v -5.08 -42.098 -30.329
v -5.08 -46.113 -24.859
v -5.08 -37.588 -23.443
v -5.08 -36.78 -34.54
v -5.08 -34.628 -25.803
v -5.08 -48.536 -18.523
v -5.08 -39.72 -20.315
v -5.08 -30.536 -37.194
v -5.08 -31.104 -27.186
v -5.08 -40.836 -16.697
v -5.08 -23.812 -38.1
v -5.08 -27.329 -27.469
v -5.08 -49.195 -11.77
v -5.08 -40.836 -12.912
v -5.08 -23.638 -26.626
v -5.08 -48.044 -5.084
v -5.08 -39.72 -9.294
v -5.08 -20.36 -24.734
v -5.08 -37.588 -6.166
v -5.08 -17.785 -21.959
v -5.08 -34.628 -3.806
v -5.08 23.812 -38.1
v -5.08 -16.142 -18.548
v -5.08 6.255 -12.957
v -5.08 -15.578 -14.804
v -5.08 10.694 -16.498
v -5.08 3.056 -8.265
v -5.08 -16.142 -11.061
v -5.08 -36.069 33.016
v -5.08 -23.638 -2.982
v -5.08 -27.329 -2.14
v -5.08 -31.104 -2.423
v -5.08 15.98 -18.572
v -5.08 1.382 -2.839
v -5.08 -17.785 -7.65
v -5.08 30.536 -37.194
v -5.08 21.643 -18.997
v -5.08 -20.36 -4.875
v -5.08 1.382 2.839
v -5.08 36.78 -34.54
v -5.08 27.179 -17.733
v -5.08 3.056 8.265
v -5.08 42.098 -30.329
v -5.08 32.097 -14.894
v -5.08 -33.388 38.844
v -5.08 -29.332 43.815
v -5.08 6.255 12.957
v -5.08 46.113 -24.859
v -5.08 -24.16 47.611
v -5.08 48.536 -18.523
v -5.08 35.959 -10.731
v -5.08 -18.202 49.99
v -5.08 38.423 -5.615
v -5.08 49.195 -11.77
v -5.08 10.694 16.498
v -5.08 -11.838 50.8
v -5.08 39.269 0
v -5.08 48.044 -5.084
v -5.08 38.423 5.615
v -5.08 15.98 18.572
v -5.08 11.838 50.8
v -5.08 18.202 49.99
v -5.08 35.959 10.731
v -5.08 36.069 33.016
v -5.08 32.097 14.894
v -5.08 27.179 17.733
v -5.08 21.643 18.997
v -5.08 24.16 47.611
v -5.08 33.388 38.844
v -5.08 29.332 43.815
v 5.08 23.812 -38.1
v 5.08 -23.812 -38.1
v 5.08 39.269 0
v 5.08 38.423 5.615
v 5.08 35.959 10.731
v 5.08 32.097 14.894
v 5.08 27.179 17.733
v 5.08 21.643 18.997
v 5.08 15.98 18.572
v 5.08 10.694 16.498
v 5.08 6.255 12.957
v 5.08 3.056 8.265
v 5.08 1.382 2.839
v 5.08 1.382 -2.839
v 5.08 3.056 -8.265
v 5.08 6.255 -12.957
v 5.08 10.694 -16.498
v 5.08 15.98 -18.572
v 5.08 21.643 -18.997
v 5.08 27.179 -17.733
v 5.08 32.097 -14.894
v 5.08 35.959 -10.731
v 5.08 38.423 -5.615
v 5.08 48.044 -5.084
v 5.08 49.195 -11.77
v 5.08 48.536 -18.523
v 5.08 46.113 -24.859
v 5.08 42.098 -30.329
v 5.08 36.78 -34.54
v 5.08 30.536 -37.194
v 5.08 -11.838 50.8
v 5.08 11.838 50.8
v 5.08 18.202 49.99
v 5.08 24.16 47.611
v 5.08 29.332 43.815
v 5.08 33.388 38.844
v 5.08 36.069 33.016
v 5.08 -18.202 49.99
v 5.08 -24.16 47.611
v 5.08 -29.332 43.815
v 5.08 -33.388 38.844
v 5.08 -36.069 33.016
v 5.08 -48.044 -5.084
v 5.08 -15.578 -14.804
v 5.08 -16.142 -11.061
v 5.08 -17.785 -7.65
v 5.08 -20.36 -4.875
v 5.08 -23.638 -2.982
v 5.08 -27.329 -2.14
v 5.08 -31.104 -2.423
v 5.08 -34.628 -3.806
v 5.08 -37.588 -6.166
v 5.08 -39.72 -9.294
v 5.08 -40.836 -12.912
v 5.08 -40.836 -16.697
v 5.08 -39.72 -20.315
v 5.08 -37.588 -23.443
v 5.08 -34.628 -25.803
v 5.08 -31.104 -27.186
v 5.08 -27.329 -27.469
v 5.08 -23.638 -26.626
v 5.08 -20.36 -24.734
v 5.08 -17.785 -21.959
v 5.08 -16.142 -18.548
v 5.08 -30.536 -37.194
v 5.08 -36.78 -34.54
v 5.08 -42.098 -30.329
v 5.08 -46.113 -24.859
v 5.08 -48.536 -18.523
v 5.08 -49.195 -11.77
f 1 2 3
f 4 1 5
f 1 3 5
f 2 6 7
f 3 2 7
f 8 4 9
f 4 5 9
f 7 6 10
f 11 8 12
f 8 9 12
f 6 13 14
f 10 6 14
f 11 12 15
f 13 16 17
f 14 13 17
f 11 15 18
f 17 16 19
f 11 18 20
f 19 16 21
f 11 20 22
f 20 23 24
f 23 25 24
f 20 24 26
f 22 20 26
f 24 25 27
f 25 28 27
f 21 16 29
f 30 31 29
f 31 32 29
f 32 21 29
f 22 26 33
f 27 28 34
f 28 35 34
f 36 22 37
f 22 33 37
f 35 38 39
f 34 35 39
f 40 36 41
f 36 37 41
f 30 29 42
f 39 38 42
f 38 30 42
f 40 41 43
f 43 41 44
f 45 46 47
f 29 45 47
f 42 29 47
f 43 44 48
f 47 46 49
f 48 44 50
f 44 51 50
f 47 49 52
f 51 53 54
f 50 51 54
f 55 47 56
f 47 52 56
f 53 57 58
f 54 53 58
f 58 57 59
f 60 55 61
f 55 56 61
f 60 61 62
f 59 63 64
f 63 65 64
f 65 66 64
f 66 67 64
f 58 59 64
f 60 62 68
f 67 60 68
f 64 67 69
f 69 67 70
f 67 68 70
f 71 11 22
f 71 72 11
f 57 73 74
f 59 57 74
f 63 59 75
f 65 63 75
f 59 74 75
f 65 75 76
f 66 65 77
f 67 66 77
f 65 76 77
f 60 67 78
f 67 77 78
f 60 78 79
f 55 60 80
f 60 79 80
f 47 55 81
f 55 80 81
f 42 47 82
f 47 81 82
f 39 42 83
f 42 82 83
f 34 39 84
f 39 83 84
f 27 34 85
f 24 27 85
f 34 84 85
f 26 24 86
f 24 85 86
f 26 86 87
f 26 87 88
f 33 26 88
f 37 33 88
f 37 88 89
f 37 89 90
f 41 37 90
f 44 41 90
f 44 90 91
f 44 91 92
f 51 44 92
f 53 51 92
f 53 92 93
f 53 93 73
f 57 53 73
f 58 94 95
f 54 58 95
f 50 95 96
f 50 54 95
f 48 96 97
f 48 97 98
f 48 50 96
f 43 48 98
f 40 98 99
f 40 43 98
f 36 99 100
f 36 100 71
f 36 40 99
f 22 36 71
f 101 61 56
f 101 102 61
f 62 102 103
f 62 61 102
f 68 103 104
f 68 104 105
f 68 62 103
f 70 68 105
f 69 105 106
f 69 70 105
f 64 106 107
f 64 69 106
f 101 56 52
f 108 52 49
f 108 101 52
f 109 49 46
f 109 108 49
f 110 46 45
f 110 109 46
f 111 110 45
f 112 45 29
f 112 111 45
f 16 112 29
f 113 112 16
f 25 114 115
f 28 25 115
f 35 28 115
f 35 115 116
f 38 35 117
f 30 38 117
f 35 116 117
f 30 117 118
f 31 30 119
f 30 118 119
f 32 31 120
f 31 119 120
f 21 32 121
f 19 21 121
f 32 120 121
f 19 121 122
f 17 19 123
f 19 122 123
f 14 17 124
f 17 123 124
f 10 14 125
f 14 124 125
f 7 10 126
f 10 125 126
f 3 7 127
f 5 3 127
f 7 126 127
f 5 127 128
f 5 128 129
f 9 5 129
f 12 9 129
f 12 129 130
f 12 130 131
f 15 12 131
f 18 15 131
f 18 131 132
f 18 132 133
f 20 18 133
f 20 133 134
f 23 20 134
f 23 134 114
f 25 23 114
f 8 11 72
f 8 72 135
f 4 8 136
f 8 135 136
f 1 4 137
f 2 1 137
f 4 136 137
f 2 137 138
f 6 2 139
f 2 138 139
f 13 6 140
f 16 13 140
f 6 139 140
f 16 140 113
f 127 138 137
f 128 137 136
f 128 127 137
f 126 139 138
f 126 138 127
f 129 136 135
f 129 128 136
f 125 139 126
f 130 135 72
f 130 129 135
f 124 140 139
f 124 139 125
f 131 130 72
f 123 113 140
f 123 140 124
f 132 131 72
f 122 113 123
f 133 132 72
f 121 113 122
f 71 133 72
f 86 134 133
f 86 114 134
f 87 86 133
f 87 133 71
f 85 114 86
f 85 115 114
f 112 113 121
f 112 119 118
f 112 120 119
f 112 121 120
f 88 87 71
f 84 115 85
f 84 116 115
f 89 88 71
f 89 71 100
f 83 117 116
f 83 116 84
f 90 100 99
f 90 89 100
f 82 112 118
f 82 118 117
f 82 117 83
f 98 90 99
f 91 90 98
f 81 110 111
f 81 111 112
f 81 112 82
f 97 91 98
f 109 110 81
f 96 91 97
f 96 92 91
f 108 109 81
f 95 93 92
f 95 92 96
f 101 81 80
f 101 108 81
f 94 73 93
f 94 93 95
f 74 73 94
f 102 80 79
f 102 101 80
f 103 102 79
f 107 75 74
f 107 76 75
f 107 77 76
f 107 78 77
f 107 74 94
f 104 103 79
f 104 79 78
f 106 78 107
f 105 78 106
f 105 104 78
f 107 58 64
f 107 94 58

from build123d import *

# Parameters (mm, degrees)
F1_DEPTH      = 5.08
F1_DEPTH_BACK = 5.08
F2_R          = 25.4
F3_R          = 19.05
F4_DEPTH      = 25.4
F5_R          = 12.7
F6_DEPTH      = 25.4


with BuildPart() as f1:
    # F0 (on Right) → F1 (new body, two sides)
    with BuildSketch(Plane.YZ) as f1_sk:
        Polygon((30.48, 50.8), (-30.48, 50.8), (-58.42, -38.1), (58.42, -38.1), align=None)
    extrude(amount=F1_DEPTH)
    extrude(f1_sk.sketch, amount=-F1_DEPTH_BACK)

    # F2
    f2_edges = [f1.edges().sort_by_distance(p)[0] for p in [
        (0, -30.48, 50.8),
        (0, -58.42, -38.1),
        (0, 30.48, 50.8),
        (0, 58.42, -38.1),
    ]]
    fillet(f2_edges, radius=F2_R)

    # F3 (on face) → F4 (cut)
    with BuildSketch(Plane.YZ.offset(5.08)):
        with Locations((20.219197, 0)):
            Circle(F3_R)
    extrude(amount=-F4_DEPTH, mode=Mode.SUBTRACT)

    # F5 (on face) → F6 (cut)
    with BuildSketch(Plane.YZ.offset(5.08)):
        with Locations((-28.277963, -14.804346)):
            Circle(F5_R)
    extrude(amount=-F6_DEPTH, mode=Mode.SUBTRACT)


solid = f1.part
